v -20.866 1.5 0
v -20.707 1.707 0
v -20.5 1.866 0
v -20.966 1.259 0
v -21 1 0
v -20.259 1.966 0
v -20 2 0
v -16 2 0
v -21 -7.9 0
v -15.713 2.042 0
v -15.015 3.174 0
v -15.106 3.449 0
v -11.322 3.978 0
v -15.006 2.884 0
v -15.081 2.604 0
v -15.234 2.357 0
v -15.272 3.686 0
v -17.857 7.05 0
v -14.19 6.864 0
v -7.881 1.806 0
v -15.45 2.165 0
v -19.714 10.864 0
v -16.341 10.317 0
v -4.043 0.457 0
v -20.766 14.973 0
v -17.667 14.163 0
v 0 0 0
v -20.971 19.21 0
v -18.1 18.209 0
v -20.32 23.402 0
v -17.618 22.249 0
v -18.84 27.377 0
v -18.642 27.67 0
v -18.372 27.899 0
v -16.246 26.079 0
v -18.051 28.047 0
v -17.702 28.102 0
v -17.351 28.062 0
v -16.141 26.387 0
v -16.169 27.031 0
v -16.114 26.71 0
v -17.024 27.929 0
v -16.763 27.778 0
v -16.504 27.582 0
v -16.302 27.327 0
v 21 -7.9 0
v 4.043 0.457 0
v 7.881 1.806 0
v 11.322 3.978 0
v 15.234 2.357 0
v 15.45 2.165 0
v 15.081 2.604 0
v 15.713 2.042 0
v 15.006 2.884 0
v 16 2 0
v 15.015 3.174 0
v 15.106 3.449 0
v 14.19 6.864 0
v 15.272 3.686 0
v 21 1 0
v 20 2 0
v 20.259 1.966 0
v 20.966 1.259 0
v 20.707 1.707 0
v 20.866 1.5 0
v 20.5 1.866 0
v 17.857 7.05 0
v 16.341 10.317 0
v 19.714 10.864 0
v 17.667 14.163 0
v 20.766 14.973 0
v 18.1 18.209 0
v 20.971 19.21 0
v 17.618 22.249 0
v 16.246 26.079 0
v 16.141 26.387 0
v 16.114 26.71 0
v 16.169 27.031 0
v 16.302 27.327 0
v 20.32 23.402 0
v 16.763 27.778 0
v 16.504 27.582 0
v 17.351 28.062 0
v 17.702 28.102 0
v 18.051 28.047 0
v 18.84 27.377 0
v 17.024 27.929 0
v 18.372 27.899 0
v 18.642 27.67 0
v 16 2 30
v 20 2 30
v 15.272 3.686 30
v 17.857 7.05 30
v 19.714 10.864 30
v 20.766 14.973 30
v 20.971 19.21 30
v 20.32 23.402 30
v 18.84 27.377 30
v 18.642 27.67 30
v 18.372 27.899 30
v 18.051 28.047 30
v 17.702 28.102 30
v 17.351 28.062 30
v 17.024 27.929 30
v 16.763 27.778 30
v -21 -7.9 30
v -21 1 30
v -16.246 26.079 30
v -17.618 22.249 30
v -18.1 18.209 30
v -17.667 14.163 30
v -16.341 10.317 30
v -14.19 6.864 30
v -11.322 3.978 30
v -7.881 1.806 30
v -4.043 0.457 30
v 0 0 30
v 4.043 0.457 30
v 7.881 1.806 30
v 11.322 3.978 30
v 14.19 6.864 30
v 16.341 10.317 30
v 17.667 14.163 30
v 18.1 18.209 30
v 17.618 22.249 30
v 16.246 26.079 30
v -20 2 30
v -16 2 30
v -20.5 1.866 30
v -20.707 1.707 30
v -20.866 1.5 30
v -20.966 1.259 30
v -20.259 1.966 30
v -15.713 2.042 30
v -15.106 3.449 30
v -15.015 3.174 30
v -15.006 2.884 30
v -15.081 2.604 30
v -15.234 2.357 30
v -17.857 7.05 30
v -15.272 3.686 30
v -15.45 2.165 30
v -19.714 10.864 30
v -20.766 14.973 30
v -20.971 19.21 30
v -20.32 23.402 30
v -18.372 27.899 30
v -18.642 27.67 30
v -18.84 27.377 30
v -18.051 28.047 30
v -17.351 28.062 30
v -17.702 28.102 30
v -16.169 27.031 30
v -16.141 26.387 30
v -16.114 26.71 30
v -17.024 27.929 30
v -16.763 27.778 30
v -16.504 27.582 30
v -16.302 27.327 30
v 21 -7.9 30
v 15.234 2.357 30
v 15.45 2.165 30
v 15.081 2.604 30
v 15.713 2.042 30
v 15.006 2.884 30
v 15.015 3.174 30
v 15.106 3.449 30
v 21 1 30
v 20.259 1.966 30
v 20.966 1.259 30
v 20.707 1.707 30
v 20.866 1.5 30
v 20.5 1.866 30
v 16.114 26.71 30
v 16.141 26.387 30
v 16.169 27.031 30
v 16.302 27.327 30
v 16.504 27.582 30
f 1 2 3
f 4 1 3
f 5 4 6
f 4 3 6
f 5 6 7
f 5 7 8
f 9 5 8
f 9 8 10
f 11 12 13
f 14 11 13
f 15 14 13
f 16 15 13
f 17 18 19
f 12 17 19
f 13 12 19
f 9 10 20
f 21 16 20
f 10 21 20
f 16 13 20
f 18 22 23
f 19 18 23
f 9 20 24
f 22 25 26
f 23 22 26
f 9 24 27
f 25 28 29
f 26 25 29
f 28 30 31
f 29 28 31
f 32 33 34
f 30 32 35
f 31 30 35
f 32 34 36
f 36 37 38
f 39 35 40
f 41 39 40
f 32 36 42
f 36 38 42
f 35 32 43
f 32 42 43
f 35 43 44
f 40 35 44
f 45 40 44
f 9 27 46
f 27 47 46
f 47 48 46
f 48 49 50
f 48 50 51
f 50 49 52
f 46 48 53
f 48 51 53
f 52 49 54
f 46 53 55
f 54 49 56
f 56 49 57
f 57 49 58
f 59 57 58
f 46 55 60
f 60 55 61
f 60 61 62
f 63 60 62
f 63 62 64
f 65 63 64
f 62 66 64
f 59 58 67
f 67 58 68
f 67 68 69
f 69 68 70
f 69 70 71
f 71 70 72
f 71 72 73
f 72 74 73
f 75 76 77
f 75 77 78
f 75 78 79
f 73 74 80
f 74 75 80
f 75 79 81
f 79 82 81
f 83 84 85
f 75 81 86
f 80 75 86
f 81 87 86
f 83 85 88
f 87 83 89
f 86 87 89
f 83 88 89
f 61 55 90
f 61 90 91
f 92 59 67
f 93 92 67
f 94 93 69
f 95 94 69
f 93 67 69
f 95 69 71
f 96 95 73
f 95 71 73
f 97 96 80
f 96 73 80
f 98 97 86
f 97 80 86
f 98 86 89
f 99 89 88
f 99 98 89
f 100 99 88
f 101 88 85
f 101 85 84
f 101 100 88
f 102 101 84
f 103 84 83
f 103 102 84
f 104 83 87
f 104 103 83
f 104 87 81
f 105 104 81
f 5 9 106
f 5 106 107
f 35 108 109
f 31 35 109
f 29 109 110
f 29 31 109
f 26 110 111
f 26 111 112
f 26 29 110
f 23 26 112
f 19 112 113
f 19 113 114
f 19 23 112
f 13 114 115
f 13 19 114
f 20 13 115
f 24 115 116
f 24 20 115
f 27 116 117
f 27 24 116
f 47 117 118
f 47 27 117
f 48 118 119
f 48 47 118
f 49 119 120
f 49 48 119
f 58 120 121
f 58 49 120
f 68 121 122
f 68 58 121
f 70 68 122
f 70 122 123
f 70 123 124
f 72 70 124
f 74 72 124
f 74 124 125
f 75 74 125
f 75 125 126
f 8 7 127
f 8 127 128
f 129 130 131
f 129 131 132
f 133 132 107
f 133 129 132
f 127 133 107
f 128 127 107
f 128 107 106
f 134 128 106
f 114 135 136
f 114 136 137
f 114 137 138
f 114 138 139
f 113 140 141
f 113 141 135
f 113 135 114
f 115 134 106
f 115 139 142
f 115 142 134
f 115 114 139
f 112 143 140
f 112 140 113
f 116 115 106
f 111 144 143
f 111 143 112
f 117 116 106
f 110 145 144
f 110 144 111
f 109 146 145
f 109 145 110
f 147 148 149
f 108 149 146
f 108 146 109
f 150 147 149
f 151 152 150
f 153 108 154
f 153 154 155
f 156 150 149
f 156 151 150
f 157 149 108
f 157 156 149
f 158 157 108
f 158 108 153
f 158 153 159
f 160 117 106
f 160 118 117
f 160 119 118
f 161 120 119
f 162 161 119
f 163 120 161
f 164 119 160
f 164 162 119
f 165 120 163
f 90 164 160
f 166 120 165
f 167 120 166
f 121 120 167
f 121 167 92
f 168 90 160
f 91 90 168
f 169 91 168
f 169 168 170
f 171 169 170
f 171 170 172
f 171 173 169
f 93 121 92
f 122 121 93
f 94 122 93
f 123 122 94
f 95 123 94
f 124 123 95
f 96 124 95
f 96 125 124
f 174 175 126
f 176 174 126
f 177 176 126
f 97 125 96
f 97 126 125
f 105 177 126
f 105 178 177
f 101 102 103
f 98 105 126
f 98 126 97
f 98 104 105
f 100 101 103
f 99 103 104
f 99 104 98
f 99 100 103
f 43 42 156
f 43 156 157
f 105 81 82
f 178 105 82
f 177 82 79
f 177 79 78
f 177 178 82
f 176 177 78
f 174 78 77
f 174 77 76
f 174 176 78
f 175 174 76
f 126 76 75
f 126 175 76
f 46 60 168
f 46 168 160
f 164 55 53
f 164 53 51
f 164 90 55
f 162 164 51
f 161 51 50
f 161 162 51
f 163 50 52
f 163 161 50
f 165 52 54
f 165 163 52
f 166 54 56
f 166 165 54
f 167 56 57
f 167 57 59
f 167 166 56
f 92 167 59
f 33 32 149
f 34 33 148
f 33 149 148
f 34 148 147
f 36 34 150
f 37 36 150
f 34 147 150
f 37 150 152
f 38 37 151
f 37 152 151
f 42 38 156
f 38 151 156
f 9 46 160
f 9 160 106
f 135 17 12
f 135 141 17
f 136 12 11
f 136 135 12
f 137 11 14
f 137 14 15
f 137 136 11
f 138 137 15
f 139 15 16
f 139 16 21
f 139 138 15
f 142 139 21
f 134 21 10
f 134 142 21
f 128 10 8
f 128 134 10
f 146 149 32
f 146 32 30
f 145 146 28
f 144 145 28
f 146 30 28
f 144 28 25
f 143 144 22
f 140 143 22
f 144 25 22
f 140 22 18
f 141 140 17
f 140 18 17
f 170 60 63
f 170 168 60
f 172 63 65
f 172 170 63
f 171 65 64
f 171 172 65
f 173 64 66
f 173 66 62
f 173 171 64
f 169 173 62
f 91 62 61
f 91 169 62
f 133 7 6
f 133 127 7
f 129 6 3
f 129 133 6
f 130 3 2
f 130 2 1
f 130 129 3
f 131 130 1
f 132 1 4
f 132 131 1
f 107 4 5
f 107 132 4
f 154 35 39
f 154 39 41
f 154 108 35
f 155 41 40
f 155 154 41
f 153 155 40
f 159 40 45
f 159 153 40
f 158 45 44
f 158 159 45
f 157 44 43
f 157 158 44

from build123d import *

# Parameters (mm, degrees)
PAD001_DEPTH = 30
FILLET_R     = 1.3
FILLET001_R  = 1


with BuildPart() as part:
    # Sketch001 → Pad001 (new body)
    with BuildSketch(Plane.XY):
        with BuildLine():
            ThreePointArc((-18.186533, 28.6), (-20.679194, 14.443373), (-13.482952, 2))
            Line((-21, 2), (-13.482952, 2))
            Line((-21, -7.9), (-21, 2))
            Line((21, -7.9), (-21, -7.9))
            Line((21, 2), (21, -7.9))
            Line((13.482952, 2), (21, 2))
            ThreePointArc((13.482952, 2), (20.679194, 14.443373), (18.186533, 28.6))
            Line((18.186533, 28.6), (15.67506, 27.15))
            ThreePointArc((-15.67506, 27.15), (0, 0), (15.67506, 27.15))
            Line((-18.186533, 28.6), (-15.67506, 27.15))
        make_face()
    extrude(amount=PAD001_DEPTH)

    # Fillet
    fillet_edges = [part.edges().sort_by_distance(p)[0] for p in [
        (-15.67506, 27.15, 15),
        (-18.186533, 28.6, 15),
        (15.67506, 27.15, 15),
        (18.186533, 28.6, 15),
    ]]
    fillet(fillet_edges, radius=FILLET_R)

    # Fillet001
    fillet001_edges = [part.edges().sort_by_distance(p)[0] for p in [
        (-13.482952, 2, 15),
        (13.482952, 2, 15),
        (21, 2, 15),
        (-21, 2, 15),
    ]]
    fillet(fillet001_edges, radius=FILLET001_R)


solid = part.part
